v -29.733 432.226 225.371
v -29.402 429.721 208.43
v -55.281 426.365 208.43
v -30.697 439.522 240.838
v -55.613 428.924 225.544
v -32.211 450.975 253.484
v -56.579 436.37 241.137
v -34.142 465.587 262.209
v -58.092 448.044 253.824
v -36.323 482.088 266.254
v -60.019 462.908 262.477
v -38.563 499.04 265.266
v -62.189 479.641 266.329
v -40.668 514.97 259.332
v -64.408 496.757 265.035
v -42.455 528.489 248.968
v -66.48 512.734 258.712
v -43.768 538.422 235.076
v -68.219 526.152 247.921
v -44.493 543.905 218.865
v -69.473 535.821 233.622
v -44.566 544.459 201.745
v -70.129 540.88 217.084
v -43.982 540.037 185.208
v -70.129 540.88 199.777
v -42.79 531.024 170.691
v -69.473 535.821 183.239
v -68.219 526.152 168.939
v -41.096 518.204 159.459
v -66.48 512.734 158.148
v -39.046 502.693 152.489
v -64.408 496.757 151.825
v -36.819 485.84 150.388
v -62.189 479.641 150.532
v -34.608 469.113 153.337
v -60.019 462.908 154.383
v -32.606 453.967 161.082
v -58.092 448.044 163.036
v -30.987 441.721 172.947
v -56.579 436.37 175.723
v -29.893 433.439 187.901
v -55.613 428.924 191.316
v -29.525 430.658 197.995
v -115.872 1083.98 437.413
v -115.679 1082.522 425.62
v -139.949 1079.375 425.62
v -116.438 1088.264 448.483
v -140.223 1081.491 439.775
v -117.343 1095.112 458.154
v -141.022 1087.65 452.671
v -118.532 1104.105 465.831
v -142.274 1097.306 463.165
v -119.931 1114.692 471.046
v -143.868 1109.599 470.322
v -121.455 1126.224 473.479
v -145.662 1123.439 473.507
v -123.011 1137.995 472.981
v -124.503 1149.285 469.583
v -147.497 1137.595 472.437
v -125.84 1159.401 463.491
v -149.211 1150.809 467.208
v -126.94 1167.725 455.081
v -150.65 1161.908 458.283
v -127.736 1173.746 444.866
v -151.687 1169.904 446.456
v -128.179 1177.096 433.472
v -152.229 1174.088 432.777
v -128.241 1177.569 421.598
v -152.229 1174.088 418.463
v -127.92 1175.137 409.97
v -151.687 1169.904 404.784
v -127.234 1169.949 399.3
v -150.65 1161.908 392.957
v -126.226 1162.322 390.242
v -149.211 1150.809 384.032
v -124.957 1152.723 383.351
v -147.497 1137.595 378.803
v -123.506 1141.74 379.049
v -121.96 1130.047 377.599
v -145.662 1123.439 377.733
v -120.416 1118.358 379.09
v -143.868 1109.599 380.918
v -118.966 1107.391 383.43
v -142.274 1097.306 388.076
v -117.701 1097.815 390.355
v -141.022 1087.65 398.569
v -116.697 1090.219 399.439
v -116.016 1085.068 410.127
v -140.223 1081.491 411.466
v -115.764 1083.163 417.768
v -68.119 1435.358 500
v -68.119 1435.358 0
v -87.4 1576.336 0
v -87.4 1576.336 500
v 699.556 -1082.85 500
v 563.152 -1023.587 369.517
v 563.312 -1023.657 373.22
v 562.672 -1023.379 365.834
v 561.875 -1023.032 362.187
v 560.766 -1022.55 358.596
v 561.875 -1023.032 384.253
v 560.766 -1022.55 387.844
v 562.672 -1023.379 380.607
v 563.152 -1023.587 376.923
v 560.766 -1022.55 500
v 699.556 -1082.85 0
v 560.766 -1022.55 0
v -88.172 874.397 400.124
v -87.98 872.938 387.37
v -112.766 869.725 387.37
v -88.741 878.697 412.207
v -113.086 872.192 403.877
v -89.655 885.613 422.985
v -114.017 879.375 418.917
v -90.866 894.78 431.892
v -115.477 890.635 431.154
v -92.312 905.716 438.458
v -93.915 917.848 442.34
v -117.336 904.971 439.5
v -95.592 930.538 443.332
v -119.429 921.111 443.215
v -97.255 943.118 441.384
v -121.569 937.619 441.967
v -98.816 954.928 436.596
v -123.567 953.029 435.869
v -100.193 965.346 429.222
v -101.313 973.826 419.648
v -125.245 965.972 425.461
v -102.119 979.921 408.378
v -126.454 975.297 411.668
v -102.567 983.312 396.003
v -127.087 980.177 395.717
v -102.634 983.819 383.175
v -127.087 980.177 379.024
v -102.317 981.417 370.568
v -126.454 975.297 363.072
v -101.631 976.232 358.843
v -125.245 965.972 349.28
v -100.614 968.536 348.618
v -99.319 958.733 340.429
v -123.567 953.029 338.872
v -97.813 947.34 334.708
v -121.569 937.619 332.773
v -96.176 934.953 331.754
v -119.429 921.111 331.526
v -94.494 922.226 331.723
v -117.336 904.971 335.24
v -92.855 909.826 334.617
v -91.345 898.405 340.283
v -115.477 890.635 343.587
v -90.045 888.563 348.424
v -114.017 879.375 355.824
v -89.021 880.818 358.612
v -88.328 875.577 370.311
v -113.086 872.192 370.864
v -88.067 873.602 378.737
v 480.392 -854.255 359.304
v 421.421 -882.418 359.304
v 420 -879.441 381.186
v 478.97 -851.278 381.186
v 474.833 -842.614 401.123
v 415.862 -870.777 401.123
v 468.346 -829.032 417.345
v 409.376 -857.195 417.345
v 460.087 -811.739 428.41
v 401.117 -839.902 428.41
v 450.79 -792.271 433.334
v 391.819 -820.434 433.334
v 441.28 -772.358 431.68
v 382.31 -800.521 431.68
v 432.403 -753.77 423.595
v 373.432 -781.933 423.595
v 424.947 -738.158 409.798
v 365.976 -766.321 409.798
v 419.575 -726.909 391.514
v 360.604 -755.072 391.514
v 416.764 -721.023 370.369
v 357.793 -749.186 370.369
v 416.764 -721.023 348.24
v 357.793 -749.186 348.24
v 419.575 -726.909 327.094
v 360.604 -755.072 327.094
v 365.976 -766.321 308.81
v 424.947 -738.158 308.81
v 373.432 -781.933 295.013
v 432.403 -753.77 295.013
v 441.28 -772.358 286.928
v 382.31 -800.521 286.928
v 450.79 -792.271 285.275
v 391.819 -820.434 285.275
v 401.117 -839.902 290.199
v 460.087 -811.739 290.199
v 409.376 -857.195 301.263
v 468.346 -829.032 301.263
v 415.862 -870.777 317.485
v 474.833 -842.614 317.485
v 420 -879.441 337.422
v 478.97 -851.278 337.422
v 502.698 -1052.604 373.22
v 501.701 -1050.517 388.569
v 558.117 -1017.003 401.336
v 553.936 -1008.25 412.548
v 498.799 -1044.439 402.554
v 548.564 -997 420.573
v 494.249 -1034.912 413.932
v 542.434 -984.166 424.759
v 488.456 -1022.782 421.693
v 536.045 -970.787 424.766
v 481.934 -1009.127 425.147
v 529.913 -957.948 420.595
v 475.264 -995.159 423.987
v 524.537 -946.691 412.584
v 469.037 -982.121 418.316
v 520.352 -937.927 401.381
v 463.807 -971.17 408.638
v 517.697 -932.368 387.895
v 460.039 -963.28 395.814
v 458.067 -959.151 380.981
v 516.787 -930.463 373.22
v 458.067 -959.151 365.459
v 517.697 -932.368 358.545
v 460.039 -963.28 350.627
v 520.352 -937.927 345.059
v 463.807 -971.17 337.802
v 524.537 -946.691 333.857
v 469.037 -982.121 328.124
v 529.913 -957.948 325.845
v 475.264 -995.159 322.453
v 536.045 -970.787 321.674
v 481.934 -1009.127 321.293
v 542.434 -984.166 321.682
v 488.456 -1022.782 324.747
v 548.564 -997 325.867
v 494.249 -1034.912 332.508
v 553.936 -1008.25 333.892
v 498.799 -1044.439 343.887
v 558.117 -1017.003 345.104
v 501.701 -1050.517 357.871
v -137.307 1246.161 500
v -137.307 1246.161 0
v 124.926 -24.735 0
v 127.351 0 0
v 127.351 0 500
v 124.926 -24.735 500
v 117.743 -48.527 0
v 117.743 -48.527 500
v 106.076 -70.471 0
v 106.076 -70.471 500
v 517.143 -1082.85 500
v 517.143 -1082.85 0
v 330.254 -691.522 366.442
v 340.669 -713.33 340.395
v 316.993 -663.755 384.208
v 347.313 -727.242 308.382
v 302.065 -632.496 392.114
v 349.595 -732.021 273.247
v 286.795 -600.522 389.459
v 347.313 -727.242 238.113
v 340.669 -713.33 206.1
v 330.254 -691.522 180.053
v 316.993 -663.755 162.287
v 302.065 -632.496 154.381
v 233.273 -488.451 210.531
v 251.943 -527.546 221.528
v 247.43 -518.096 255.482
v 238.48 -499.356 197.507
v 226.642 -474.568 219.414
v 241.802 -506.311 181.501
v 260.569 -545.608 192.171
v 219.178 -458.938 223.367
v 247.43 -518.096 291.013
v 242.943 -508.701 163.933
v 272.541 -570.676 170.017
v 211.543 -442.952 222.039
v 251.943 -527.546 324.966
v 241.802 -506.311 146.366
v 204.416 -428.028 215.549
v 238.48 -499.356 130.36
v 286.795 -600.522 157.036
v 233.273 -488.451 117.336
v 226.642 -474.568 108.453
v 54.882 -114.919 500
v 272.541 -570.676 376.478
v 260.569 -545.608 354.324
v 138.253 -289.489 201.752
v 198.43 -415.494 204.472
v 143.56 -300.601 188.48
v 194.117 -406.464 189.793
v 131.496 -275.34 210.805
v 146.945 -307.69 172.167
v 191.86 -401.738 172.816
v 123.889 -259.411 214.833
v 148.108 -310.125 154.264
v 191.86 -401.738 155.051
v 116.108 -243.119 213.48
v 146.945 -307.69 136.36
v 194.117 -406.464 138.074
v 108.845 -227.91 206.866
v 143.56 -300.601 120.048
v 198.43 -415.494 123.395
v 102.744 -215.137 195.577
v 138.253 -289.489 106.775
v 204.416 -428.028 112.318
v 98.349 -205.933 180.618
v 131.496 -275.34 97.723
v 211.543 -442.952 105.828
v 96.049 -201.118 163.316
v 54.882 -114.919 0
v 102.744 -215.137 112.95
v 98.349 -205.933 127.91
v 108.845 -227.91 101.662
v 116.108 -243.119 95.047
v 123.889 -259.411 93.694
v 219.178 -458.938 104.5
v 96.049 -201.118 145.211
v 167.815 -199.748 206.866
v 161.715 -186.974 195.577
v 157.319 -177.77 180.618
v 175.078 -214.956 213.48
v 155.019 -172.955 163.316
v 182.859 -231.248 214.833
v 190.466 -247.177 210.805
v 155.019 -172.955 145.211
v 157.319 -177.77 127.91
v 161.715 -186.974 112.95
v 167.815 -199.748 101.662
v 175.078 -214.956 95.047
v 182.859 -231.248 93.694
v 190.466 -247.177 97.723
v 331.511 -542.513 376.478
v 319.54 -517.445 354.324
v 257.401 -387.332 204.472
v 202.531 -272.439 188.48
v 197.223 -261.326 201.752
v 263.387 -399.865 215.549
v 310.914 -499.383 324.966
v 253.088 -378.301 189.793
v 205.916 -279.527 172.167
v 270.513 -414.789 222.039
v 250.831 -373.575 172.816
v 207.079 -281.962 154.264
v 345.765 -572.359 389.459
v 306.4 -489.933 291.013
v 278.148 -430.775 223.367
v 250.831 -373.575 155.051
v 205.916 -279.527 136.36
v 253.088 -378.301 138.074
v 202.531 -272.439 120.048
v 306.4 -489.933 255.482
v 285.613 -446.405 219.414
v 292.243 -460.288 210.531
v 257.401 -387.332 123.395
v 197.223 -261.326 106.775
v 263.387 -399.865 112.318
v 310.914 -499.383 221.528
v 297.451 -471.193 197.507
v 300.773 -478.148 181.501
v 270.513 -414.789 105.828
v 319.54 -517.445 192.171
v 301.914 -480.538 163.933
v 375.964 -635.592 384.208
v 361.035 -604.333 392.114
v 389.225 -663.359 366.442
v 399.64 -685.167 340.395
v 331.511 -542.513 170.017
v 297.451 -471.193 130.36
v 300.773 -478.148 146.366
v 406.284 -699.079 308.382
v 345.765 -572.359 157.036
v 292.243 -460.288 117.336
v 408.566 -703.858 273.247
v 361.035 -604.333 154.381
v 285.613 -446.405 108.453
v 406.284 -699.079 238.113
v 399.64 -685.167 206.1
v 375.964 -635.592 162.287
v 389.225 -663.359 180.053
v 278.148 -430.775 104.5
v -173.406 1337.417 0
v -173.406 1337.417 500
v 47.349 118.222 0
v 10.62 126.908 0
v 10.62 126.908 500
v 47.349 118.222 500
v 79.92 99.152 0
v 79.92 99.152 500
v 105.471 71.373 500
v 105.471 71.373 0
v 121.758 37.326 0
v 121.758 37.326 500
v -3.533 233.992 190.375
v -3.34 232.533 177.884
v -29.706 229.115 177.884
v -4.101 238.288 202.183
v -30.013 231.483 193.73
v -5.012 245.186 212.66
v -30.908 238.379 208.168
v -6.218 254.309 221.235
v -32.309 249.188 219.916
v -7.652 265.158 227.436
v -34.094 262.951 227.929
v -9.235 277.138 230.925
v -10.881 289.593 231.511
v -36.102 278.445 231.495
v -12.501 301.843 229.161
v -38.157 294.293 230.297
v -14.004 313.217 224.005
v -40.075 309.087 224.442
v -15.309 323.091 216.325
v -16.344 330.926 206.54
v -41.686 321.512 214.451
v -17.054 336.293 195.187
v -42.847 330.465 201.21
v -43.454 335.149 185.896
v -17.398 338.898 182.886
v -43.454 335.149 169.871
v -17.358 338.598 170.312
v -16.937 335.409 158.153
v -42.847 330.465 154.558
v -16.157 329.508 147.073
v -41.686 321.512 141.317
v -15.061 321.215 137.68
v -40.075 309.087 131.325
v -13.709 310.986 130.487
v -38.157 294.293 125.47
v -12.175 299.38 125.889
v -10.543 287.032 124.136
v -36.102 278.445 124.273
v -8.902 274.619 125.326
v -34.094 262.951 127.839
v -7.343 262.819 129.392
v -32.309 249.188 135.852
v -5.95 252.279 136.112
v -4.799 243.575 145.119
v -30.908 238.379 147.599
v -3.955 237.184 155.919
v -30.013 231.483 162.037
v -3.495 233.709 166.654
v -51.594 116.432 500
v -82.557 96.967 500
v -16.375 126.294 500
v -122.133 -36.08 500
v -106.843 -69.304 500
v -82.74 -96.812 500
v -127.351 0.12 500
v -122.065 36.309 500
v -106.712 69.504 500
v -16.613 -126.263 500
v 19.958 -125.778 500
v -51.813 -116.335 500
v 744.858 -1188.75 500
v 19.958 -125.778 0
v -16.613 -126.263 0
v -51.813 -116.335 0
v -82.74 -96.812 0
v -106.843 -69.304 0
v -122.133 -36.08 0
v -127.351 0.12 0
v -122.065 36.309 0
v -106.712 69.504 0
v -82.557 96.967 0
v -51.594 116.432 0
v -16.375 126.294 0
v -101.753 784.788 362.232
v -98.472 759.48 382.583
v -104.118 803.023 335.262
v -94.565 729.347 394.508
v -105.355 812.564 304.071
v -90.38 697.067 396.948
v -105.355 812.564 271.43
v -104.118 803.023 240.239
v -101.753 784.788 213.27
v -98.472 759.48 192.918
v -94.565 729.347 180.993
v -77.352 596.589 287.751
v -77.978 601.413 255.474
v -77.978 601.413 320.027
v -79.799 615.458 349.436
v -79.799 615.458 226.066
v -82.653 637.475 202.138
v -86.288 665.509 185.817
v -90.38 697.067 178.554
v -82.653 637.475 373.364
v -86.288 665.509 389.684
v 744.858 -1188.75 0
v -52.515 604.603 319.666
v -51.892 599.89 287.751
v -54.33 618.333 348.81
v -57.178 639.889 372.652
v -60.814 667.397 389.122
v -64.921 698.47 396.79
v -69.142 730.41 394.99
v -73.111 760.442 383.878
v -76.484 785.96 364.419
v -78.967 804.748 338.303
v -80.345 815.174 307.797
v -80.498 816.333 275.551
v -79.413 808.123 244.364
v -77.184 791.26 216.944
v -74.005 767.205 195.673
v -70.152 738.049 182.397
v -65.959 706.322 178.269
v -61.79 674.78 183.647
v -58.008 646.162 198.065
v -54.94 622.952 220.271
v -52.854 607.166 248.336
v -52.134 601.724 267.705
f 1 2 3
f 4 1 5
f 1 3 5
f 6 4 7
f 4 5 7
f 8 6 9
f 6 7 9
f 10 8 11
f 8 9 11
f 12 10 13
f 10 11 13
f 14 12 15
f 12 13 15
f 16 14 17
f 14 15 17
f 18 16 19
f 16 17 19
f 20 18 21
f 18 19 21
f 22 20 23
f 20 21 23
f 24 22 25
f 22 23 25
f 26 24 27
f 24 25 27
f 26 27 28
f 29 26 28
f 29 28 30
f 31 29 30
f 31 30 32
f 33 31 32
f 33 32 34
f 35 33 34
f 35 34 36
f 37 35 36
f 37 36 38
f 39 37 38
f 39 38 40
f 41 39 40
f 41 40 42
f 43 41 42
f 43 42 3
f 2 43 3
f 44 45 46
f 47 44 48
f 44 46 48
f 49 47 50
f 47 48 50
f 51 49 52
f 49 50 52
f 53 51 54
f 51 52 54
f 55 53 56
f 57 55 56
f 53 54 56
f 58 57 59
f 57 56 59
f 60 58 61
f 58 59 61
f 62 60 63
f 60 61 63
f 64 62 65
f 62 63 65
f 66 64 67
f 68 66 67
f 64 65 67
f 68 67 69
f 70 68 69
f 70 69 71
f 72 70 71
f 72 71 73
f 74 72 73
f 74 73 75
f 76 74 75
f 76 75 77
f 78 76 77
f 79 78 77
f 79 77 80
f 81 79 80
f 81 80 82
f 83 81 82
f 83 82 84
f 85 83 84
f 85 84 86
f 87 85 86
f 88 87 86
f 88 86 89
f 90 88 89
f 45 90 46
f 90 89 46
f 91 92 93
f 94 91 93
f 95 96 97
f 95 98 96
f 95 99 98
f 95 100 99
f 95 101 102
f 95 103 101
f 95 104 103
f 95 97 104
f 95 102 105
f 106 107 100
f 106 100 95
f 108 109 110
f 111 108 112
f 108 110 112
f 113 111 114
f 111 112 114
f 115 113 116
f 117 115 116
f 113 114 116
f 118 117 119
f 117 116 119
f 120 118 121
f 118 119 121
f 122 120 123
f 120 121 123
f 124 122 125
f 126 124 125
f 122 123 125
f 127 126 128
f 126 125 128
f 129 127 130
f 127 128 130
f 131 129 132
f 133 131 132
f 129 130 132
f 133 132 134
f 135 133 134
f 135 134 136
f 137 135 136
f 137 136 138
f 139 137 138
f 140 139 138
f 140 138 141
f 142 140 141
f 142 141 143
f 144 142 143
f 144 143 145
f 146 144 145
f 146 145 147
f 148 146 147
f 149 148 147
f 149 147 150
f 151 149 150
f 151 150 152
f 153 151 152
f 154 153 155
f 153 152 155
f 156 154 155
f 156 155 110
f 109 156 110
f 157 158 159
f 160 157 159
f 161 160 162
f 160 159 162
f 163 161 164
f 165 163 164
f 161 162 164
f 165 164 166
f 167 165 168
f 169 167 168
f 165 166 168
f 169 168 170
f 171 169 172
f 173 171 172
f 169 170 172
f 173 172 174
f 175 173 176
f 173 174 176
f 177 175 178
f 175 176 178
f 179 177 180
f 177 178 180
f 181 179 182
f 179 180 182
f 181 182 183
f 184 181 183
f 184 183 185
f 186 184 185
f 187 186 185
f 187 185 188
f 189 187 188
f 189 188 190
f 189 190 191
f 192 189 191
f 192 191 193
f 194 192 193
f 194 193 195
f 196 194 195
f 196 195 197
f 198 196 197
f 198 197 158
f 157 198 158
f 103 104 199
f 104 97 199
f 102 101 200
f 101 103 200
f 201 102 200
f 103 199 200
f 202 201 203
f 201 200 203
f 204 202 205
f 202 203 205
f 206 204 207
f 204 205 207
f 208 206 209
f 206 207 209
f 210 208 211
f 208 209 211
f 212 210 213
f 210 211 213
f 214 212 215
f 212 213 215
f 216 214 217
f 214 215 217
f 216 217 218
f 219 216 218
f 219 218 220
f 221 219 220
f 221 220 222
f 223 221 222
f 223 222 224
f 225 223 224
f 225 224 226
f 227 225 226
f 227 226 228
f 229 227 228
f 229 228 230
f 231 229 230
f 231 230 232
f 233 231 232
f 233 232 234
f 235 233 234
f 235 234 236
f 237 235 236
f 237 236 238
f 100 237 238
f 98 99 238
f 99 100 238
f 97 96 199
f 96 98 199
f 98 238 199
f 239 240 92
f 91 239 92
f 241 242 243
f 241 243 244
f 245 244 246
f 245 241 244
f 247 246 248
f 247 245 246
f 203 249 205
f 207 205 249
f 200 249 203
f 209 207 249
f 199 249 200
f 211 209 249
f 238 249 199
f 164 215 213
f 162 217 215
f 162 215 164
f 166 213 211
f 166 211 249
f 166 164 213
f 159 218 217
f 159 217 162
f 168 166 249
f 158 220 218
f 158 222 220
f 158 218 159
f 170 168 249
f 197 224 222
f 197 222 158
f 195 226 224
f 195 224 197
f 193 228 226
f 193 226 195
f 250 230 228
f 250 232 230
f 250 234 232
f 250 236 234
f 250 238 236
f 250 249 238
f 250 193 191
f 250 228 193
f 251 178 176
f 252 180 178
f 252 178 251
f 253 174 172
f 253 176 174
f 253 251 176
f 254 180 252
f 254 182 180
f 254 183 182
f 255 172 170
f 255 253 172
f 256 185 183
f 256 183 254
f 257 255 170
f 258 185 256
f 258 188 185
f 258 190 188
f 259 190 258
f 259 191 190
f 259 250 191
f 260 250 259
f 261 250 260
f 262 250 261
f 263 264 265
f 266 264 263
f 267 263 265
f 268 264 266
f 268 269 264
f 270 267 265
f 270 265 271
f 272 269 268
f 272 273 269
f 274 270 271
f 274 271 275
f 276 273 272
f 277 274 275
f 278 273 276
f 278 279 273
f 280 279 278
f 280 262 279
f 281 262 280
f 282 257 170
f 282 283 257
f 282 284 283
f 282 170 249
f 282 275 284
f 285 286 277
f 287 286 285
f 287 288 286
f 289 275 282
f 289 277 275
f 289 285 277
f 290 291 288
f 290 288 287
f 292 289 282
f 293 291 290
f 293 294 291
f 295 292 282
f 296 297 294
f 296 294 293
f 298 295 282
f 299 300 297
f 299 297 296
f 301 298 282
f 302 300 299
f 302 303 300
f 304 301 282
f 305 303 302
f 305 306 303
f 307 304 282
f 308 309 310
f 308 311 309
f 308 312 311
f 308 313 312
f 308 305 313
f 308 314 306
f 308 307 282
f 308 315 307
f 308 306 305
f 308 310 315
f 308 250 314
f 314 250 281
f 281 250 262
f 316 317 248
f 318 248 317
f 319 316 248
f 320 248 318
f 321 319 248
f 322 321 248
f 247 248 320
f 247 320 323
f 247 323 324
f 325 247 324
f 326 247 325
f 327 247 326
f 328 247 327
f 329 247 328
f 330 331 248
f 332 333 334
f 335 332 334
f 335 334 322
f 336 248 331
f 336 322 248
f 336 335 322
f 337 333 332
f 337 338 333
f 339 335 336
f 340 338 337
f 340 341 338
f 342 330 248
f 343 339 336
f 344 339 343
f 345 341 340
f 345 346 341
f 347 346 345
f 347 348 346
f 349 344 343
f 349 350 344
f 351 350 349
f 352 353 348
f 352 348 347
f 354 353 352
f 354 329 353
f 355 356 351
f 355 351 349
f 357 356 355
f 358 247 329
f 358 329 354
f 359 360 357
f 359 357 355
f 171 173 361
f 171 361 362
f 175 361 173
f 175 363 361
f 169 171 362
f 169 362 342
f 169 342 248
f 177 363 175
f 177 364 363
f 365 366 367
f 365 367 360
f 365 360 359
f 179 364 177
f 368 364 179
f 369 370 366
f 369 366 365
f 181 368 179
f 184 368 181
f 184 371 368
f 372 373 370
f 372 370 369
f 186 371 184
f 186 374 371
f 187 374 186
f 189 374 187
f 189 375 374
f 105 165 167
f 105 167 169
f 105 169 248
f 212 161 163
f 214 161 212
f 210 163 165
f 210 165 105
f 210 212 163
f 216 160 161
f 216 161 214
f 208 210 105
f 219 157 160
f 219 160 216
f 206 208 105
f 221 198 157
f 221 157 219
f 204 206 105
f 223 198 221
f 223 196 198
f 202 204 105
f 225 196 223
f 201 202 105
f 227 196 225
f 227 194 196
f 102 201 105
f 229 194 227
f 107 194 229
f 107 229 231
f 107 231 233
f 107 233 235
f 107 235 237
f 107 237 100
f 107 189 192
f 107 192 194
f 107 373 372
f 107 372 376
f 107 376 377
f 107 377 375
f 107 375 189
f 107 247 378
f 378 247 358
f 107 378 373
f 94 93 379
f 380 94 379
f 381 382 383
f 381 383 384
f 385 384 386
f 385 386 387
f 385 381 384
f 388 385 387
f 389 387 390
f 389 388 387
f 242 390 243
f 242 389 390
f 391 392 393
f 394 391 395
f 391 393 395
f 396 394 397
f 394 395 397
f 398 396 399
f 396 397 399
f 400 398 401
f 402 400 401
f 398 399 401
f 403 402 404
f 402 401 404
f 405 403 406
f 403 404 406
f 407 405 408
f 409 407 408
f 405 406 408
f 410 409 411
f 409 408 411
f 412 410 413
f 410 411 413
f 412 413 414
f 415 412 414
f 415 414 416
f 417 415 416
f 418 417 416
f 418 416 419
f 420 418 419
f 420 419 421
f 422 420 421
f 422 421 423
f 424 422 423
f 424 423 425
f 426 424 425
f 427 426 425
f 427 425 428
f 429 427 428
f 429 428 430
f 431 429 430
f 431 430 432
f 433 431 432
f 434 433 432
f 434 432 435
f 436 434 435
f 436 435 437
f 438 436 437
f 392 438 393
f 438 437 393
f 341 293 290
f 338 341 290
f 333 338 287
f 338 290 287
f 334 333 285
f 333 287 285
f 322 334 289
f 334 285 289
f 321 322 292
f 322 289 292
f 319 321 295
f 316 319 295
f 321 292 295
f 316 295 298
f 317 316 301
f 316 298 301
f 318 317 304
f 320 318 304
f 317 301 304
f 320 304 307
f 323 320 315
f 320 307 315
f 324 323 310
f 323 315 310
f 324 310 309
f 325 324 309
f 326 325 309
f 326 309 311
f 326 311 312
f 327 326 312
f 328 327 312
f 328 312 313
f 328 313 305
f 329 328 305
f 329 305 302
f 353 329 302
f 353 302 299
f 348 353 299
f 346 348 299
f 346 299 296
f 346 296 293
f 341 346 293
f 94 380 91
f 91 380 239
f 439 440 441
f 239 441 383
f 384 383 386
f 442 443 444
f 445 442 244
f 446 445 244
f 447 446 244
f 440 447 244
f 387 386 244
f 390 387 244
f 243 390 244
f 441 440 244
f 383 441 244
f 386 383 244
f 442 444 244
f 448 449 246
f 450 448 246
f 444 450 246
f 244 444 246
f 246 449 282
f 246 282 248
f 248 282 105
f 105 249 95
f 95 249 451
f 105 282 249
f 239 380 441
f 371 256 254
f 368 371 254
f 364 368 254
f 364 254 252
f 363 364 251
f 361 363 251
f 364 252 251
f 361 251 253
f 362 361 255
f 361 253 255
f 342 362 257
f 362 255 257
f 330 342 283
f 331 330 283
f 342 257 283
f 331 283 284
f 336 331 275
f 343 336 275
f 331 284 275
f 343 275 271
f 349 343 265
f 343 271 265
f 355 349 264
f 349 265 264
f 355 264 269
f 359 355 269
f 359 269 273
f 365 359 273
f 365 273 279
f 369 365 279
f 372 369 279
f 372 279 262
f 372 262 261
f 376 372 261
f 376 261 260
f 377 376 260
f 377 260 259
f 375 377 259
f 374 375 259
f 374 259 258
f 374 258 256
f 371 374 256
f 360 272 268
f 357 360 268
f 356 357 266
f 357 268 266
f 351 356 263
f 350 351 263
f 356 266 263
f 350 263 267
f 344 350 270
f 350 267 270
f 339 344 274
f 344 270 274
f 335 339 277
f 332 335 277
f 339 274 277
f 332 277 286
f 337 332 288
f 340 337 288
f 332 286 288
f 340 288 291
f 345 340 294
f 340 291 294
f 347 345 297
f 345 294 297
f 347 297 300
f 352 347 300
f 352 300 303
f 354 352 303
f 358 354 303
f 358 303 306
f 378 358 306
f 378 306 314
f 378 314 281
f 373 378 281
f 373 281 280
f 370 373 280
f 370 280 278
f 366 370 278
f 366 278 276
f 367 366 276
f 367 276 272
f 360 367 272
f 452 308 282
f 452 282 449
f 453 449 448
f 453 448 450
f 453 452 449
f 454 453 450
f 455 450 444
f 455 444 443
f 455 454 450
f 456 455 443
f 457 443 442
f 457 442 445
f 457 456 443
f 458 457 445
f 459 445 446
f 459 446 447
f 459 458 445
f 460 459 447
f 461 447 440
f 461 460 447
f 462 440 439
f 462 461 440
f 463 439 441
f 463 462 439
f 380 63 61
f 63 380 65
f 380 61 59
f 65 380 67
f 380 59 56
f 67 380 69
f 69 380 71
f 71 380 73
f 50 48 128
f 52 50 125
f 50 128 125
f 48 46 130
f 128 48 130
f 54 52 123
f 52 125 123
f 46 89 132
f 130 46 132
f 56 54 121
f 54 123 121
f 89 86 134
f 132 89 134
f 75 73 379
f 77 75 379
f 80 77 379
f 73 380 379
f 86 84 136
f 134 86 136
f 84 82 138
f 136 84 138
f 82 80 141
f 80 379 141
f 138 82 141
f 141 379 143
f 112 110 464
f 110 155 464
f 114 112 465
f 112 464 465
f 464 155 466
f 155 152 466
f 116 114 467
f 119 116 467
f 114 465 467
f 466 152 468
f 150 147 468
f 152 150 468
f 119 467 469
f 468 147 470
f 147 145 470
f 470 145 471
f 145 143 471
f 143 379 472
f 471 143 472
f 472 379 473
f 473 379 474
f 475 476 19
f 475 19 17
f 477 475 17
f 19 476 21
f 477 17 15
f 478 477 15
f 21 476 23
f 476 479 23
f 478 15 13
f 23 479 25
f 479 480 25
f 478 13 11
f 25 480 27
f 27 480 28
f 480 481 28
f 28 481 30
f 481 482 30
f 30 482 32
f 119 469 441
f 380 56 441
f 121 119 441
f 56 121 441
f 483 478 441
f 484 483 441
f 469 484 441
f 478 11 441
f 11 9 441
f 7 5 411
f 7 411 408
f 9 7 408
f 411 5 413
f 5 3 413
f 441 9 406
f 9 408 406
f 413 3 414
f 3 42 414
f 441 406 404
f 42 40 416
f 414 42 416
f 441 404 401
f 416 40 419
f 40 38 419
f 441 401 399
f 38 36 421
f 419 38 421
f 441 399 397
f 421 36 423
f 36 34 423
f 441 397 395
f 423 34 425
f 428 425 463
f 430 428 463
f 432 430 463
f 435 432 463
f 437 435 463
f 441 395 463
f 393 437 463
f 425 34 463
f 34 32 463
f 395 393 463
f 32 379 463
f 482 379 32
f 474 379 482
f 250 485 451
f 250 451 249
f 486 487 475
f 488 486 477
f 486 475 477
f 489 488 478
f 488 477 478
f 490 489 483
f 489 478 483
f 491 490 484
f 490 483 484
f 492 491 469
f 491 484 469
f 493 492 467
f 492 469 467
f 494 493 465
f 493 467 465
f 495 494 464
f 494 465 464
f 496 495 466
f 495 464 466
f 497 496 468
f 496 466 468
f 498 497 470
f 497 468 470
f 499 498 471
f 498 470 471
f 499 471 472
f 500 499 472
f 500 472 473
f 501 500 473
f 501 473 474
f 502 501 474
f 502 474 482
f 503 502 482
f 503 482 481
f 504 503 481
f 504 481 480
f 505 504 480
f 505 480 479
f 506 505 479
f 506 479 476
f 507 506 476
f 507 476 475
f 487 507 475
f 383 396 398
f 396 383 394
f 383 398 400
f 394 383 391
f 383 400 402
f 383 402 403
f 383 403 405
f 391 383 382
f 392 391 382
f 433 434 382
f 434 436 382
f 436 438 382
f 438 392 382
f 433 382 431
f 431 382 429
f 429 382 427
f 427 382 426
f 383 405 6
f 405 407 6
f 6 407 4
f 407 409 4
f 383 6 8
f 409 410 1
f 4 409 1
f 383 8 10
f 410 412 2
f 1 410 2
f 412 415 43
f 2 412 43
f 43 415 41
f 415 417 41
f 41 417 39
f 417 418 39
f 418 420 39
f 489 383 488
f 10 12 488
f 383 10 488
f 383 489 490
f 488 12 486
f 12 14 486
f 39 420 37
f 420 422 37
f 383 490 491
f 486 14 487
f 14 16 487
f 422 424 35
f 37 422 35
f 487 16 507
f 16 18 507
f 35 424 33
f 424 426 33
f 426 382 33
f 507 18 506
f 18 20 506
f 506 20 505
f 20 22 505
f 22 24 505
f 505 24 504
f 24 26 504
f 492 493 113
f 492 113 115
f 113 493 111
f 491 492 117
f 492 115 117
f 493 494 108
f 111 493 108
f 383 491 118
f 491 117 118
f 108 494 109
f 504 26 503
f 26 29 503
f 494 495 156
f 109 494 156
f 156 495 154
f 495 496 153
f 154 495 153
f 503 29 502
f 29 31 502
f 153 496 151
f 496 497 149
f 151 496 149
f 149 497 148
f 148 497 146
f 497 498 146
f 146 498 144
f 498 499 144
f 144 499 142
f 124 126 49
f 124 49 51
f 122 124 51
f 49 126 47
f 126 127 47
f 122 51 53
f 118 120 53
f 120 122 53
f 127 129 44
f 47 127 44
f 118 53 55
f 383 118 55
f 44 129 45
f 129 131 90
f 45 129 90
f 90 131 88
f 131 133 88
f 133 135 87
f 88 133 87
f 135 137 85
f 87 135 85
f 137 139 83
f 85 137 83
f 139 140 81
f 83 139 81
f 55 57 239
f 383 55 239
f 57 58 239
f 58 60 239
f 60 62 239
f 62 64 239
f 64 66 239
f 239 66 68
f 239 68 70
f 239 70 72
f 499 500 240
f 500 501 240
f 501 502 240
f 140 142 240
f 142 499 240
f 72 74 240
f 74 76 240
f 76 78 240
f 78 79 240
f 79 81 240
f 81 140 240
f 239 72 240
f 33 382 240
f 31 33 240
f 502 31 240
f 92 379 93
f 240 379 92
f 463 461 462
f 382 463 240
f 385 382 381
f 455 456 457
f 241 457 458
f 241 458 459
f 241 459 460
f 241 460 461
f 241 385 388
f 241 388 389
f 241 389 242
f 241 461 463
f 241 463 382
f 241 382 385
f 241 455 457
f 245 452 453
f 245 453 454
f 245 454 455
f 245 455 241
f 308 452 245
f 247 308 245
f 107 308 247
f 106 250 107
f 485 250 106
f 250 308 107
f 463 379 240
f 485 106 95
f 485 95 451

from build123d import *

# Parameters (mm, degrees)
F1_DEPTH = 500
F2_R     = 48.0212425181
F2_R_2   = 56.0010929185
F2_R_3   = 109.5030020502
F2_R_4   = 58.0607354524
F2_R_5   = 53.7611851769
F3_DEPTH = 50
F5_DEPTH = 500
F6_R     = 60.7396670844
F6_R_2   = 74.2371640954
F6_R_3   = 52.0726222856
F6_R_4   = 59.6000564376
F6_R_5   = 119.2001237969
F7_DEPTH = 100


# Not quite as in the source:
# - a feature names something its author has since deleted; it is built from what else it names


with BuildPart() as f1:
    # F0 (on Top) → F1 (new body)
    with BuildSketch(Plane.XY):
        with BuildLine():
            ThreePointArc((-16.3297786736, 125.9457753498), (-2.847496792, 126.9680737903), (10.6670605483, 126.5512300187))
            Line((10.6670605483, 126.5512300187), (-137.3067498207, 1246.1612224579))
            Line((-137.3067498207, 1246.1612224579), (-68.1192024335, 1435.3577301921))
            Line((-68.1192024335, 1435.3577301921), (-87.3996093869, 1576.3362646103))
            Line((-87.3996093869, 1576.3362646103), (-173.4057664871, 1337.4170064926))
            Line((-173.4057664871, 1337.4170064926), (-16.3297786736, 125.9457753498))
        make_face()
        with BuildLine():
            ThreePointArc((-16.3297786736, 125.9457753498), (-83.8305377188, -95.4014724508), (127, 0))
            ThreePointArc((127, 0), (93.4979055638, 85.9484825647), (10.6670605483, 126.5512300187))
            ThreePointArc((10.6670605483, 126.5512300187), (-2.847496792, 126.9680737903), (-16.3297786736, 125.9457753498))
        make_face()
    extrude(amount=F1_DEPTH)

    # F2 (on face) → F3 (cut)
    with BuildSketch(Plane(origin=(0, 0, 0), x_dir=(0.1285809344, -0.9916990185, 0), z_dir=(-0.9916990185, -0.1285809344, 0))):
        with Locations((-1136.4312171936, 425.6200194359)):
            Circle(F2_R)
        with Locations((-933.0058097839, 387.370377779)):
            Circle(F2_R_2)
        with Locations((-711.0854387283, 287.7508103848)):
            Circle(F2_R_3)
        with Locations((-487.9950881004, 208.4301263094)):
            Circle(F2_R_4)
        with Locations((-284.7935259342, 177.8837442398)):
            Circle(F2_R_5)
    extrude(amount=-F3_DEPTH, mode=Mode.SUBTRACT)

    # F4 (on face) → F5 (join)
    with BuildSketch(Plane(origin=(0, 0, 0), x_dir=(1, 0, 0), z_dir=(0, 0, -1))):
        with BuildLine():
            Line((517.1427625415, 1082.8496493747), (54.8823102258, 114.918538341))
            ThreePointArc((54.8823102258, 114.918538341), (83.4911676886, 96.1642519242), (106.0759476154, 70.4714961361))
            Line((106.0759476154, 70.4714961361), (560.7657432556, 1022.5503444672))
            Line((560.7657432556, 1022.5503444672), (699.5562911034, 1082.8496493747))
            Line((699.5562911034, 1082.8496493747), (744.8581457138, 1188.7502670288))
            Line((744.8581457138, 1188.7502670288), (517.1427625415, 1082.8496493747))
        make_face()
        with BuildLine():
            ThreePointArc((106.0759476154, 70.4714961361), (83.4911676886, 96.1642519242), (54.8823102258, 114.918538341))
            ThreePointArc((54.8823102258, 114.918538341), (-107.7210952255, -67.9301411273), (127.3512403951, 0))
            ThreePointArc((127.3512403951, 0), (121.9164507666, 36.8064866923), (106.0759476154, 70.4714961361))
        make_face()
    extrude(amount=-F5_DEPTH)

    # F6 (on face) → F7 (cut)
    with BuildSketch(Plane(origin=(0, 0, 0), x_dir=(0.4309523021, -0.9023747078, 0), z_dir=(-0.9023747078, -0.4309523021, 0))):
        with Locations((282.9372286797, 154.2636454105)):
            Circle(F6_R)
        with Locations((903.6465287209, 359.3041300774)):
            Circle(F6_R_2)
        with Locations((1114.4098043442, 373.2200860977)):
            Circle(F6_R_3)
        with Locations((504.1354894638, 163.9334559441)):
            Circle(F6_R_4)
        with Locations((692.0155882835, 273.2473611832)):
            Circle(F6_R_5)
    extrude(amount=-F7_DEPTH, mode=Mode.SUBTRACT)


solid = f1.part
